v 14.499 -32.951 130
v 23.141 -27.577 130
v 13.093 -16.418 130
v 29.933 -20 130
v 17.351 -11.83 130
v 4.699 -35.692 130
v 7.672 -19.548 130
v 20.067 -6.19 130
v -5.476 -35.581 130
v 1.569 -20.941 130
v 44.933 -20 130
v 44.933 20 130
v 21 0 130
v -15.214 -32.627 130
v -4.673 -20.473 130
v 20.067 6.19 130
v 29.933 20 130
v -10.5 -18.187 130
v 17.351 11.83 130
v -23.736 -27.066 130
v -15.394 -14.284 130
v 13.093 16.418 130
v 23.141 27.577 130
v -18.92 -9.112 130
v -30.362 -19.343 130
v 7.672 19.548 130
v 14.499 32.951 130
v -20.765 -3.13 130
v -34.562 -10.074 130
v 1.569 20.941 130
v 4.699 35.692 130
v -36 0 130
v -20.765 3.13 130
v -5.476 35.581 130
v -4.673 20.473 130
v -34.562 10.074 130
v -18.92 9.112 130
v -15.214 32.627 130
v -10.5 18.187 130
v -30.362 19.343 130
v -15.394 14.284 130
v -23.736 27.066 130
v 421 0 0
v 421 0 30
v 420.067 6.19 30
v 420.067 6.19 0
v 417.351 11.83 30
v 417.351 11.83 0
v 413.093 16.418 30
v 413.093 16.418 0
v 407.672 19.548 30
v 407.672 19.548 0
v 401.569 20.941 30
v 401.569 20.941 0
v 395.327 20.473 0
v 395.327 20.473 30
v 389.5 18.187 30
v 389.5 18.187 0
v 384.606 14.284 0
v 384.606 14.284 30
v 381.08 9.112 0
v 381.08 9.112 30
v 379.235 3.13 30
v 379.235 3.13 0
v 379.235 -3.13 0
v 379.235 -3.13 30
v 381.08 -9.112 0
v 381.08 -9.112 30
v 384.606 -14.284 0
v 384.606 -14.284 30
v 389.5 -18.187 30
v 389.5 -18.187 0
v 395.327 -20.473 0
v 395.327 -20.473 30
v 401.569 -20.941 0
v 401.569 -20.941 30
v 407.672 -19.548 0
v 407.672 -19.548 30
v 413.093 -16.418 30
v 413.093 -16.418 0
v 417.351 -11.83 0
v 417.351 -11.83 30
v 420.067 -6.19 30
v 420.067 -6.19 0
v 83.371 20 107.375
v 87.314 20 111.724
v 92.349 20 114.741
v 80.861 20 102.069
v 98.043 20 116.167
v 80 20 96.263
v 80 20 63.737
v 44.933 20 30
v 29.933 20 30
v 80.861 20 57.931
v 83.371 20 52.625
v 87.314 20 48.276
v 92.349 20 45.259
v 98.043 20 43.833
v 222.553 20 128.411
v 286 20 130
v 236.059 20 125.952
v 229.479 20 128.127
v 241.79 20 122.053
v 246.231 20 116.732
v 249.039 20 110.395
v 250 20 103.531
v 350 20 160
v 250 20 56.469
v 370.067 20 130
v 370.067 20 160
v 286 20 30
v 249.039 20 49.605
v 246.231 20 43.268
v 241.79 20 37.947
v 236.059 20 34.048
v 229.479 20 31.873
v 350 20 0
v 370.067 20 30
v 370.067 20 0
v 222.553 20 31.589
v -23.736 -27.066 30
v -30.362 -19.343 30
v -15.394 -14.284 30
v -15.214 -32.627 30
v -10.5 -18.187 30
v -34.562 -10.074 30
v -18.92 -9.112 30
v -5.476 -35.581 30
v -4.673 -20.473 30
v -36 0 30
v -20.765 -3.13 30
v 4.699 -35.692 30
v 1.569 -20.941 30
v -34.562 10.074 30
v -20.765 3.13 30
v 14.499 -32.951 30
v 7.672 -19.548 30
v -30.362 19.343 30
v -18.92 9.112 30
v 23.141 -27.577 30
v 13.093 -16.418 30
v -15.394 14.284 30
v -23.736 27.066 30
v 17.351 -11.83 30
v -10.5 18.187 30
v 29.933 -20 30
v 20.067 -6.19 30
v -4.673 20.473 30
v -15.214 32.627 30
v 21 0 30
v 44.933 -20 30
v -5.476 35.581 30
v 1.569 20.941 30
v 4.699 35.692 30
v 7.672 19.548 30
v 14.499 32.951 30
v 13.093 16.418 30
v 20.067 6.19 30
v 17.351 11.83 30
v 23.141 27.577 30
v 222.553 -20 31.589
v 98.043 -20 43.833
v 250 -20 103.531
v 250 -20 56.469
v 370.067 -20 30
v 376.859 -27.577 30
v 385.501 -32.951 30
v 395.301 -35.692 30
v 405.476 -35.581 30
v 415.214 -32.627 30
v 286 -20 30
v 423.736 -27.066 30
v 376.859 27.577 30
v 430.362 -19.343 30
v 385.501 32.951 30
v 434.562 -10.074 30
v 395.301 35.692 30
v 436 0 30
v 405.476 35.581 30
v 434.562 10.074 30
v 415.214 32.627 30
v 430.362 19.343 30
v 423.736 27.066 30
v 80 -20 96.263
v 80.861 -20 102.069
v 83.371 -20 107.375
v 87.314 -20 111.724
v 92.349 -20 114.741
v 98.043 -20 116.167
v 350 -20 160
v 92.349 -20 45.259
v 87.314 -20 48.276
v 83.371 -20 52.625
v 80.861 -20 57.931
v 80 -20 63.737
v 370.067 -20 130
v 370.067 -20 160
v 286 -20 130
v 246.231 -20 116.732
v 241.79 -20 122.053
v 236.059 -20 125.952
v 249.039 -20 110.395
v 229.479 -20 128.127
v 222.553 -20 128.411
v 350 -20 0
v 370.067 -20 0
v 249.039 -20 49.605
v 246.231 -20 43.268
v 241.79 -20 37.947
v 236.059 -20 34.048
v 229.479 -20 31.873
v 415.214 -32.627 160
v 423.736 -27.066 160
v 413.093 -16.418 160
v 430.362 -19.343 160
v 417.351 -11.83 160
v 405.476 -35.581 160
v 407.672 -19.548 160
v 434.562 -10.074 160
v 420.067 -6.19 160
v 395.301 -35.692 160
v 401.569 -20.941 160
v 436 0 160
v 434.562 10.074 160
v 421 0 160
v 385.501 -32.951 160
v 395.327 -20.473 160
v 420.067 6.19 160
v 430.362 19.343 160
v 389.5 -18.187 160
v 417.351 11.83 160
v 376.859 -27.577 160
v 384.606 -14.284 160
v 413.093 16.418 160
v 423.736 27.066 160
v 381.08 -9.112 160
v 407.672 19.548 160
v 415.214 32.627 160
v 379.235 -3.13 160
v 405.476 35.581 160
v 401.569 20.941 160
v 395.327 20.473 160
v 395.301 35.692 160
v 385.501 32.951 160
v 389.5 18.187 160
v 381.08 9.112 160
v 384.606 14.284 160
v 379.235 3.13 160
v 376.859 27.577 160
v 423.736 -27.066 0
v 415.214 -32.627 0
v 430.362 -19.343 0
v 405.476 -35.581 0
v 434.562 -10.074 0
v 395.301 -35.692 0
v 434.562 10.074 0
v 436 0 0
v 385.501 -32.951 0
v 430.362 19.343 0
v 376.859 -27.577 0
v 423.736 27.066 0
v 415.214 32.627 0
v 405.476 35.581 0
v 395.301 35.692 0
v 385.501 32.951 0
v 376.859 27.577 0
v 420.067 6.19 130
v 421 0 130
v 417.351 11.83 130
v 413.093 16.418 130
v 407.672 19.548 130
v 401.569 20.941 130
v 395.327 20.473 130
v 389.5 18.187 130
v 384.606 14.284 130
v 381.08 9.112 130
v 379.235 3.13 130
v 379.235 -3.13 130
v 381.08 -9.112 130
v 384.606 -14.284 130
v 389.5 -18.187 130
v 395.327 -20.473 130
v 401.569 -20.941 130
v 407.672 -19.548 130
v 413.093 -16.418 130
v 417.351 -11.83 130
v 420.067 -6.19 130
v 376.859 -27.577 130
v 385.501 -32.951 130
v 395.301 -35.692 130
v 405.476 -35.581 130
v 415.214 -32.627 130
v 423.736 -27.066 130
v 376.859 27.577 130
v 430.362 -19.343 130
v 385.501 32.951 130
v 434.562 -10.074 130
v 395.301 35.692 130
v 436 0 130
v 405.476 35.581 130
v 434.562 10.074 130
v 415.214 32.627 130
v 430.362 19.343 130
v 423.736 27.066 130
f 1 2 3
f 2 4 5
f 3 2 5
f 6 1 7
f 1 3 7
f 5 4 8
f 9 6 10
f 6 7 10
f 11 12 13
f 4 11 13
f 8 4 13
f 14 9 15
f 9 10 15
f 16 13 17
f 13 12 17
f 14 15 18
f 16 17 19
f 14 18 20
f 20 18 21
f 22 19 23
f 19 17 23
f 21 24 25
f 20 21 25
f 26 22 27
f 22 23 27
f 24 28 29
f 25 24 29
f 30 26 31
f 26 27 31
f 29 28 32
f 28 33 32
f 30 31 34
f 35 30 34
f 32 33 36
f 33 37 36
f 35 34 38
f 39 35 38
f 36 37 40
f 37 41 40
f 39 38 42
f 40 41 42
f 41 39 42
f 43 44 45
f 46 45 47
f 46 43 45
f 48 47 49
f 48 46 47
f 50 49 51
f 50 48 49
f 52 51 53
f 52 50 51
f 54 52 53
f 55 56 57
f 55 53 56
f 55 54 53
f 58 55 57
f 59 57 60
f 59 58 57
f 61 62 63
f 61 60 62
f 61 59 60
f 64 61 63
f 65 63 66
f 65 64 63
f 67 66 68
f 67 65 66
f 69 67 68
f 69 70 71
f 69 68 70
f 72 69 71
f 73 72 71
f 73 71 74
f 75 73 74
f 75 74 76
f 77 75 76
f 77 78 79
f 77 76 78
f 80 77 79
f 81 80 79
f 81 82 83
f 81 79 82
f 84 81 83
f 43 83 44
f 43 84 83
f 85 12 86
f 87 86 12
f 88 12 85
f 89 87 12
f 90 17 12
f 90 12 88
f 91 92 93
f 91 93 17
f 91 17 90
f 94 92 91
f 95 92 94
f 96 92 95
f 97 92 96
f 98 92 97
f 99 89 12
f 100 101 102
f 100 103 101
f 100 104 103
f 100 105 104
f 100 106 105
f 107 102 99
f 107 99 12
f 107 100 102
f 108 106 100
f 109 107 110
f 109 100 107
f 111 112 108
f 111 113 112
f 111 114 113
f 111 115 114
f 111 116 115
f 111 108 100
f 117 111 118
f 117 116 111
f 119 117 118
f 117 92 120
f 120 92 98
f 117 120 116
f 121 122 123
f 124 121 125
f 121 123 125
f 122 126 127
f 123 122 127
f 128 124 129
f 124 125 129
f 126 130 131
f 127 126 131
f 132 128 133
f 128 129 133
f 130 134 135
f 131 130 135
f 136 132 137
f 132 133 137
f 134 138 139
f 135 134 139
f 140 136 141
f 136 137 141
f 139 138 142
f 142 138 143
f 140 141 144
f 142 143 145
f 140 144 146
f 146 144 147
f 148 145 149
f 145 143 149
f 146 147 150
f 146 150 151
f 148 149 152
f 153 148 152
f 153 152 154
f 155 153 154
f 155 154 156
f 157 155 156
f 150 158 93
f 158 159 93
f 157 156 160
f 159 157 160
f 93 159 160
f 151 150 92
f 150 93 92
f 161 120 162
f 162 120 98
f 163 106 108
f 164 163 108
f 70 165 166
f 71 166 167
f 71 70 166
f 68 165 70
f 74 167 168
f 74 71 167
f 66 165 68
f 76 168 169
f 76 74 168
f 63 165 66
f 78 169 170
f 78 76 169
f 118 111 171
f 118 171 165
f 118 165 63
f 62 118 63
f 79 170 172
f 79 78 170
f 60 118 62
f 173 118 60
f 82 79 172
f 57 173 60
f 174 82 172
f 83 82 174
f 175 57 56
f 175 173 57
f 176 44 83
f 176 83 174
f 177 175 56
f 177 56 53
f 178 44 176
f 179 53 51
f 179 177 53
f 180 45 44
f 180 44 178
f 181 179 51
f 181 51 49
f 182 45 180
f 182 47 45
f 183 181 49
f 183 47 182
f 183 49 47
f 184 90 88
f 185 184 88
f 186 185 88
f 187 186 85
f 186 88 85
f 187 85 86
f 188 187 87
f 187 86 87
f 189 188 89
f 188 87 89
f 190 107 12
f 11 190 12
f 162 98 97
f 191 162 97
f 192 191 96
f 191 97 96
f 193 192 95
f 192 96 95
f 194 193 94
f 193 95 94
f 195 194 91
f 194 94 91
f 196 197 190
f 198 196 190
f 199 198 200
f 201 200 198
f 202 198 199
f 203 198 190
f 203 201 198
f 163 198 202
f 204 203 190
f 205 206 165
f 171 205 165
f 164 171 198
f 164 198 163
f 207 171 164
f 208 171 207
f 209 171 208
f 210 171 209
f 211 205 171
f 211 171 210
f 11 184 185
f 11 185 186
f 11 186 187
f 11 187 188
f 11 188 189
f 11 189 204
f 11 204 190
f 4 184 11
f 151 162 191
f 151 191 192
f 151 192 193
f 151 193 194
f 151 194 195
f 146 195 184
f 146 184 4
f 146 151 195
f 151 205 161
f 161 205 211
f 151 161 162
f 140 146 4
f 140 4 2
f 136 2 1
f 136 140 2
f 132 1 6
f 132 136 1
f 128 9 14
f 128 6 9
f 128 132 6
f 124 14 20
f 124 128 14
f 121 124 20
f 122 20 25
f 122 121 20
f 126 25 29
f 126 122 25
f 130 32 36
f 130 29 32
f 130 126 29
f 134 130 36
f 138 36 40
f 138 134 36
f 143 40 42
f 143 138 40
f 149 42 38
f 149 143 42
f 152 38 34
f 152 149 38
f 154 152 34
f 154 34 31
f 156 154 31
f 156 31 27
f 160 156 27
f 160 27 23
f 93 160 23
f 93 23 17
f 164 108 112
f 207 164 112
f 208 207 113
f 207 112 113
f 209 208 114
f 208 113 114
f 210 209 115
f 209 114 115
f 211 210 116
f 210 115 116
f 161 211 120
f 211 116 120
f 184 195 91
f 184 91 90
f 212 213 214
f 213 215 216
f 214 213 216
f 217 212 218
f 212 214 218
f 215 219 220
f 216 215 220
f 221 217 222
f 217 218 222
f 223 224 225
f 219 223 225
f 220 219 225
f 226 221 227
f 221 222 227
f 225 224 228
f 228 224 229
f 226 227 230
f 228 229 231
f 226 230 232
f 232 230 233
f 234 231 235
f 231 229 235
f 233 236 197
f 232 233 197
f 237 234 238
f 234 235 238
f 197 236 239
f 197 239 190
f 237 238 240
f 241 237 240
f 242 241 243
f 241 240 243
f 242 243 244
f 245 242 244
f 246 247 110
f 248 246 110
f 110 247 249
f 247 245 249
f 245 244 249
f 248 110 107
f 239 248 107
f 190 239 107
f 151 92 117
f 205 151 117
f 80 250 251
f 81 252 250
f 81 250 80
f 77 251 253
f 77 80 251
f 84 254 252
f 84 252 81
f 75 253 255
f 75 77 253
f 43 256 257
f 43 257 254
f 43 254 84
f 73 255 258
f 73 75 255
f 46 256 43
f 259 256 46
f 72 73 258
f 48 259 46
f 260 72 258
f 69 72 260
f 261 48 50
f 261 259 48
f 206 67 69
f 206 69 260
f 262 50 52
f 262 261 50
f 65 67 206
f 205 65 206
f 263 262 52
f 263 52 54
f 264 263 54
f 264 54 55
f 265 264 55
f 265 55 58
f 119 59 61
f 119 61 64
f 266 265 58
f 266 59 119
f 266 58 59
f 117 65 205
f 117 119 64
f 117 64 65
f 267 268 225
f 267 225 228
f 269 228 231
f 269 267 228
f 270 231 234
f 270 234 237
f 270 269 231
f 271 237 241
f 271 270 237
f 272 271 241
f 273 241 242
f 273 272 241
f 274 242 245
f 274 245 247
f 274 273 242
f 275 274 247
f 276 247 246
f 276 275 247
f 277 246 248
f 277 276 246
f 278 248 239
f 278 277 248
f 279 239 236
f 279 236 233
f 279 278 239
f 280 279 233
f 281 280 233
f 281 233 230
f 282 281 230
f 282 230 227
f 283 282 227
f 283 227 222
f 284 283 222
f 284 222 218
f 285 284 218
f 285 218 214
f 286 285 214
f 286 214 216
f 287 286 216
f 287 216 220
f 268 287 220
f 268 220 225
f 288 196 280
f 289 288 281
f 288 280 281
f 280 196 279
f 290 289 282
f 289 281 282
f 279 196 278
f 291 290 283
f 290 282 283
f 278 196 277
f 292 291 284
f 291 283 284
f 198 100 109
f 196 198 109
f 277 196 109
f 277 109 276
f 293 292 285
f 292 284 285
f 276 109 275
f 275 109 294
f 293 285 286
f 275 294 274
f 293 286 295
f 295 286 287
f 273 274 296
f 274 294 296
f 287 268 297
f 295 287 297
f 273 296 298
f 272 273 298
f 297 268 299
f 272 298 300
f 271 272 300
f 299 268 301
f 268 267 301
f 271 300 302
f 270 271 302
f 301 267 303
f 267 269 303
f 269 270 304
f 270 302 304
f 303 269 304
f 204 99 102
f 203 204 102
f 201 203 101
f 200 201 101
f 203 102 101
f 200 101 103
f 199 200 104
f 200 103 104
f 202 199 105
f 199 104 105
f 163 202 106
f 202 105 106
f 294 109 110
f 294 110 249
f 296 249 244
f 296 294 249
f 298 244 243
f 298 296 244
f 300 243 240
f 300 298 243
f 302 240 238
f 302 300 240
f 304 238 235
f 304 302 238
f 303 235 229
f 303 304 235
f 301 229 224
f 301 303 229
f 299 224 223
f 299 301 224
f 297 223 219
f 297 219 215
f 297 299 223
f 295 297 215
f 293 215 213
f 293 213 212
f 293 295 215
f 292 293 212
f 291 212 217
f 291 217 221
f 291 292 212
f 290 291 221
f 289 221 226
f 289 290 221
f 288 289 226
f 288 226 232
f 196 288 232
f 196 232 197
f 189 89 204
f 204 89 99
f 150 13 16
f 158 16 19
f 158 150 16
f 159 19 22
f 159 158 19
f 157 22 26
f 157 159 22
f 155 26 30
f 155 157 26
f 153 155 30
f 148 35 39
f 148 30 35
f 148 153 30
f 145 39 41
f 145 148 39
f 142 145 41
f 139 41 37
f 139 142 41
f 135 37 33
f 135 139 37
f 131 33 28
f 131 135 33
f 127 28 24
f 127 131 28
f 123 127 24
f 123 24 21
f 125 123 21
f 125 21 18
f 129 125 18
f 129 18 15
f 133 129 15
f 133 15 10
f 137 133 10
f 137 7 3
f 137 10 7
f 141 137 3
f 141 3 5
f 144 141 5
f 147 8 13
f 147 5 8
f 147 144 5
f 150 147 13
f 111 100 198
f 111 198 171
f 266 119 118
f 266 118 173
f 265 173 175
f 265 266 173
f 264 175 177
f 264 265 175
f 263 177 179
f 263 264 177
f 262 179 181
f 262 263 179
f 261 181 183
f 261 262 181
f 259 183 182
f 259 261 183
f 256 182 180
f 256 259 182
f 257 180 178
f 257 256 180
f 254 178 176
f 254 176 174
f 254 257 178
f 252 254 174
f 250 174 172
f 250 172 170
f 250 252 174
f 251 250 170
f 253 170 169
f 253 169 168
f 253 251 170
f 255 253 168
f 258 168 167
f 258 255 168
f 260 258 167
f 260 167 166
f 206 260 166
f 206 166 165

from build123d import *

# Parameters (mm, degrees)
SKETCH1_R               = 21
BOSS_EXTRUDE1_DEPTH     = 160
SKETCH3_W               = 65.933259094
SKETCH3_H               = 30
CUT_EXTRUDE3_DEPTH      = 17
CUT_EXTRUDE3_DEPTH_BACK = 57
CUT_EXTRUDE4_DEPTH      = 17
CUT_EXTRUDE4_DEPTH_BACK = 57
SKETCH6_W               = 300
SKETCH6_H               = 100
CUT_EXTRUDE5_DEPTH      = 17
CUT_EXTRUDE5_DEPTH_BACK = 57


with BuildPart() as part:
    # Sketch1 → Boss-Extrude1 (new body)
    with BuildSketch(Plane.XY):
        with BuildLine():
            Line((29.933259094, 20), (370.066740906, 20))
            ThreePointArc((370.066740906, 20), (436, 0), (370.066740906, -20))
            Line((370.066740906, -20), (29.933259094, -20))
            ThreePointArc((29.933259094, -20), (-36, 0), (29.933259094, 20))
        make_face()
        Circle(SKETCH1_R, mode=Mode.SUBTRACT)
        with Locations((400, 0)):
            Circle(SKETCH1_R, mode=Mode.SUBTRACT)
    extrude(amount=BOSS_EXTRUDE1_DEPTH)

    # Sketch3 → Cut-Extrude3 (cut, two sides)
    with BuildSketch(Plane(origin=(0, 20, 0), x_dir=(1, 0, 0), z_dir=(0, 1, 0))) as cut_extrude3_sk:
        Polygon((29.933259094, 0), (29.933259094, -30), (44.933259094, -30), (350, 0), align=None)
        with Locations((-3.033370453, -15)):
            Rectangle(SKETCH3_W, SKETCH3_H)
        with Locations((-3.033370453, -145)):
            Rectangle(SKETCH3_W, SKETCH3_H)
        Polygon((44.933259094, -130), (29.933259094, -130), (29.933259094, -160), (350, -160), align=None)
    extrude(amount=CUT_EXTRUDE3_DEPTH, mode=Mode.SUBTRACT)
    extrude(cut_extrude3_sk.sketch, amount=-CUT_EXTRUDE3_DEPTH_BACK, mode=Mode.SUBTRACT)

    # Sketch5 → Cut-Extrude4 (cut, two sides)
    with BuildSketch(Plane(origin=(0, 20, 0), x_dir=(1, 0, 0), z_dir=(0, 1, 0))) as cut_extrude4_sk:
        with BuildLine():
            Line((80, -63.737300936), (80, -96.262699064))
            ThreePointArc((80, -96.262699064), (85.181990285, -109.69499552), (98.042658808, -116.166689002))
            Line((98.042658808, -116.166689002), (222.553323511, -128.410960305))
            ThreePointArc((222.553323511, -128.410960305), (241.79037057, -122.053485026), (250, -103.530972882))
            Line((250, -103.530972882), (250, -56.469027118))
            ThreePointArc((250, -56.469027118), (241.79037057, -37.946514974), (222.553323511, -31.589039695))
            Line((222.553323511, -31.589039695), (98.042658808, -43.833310998))
            ThreePointArc((98.042658808, -43.833310998), (85.181990285, -50.30500448), (80, -63.737300936))
        make_face()
    extrude(amount=CUT_EXTRUDE4_DEPTH, mode=Mode.SUBTRACT)
    extrude(cut_extrude4_sk.sketch, amount=-CUT_EXTRUDE4_DEPTH_BACK, mode=Mode.SUBTRACT)

    # Sketch6 → Cut-Extrude5 (cut, two sides)
    with BuildSketch(Plane(origin=(0, 20, 0), x_dir=(1, 0, 0), z_dir=(0, 1, 0))) as cut_extrude5_sk:
        with Locations((436, -80)):
            Rectangle(SKETCH6_W, SKETCH6_H)
    extrude(amount=CUT_EXTRUDE5_DEPTH, mode=Mode.SUBTRACT)
    extrude(cut_extrude5_sk.sketch, amount=-CUT_EXTRUDE5_DEPTH_BACK, mode=Mode.SUBTRACT)


solid = part.part
